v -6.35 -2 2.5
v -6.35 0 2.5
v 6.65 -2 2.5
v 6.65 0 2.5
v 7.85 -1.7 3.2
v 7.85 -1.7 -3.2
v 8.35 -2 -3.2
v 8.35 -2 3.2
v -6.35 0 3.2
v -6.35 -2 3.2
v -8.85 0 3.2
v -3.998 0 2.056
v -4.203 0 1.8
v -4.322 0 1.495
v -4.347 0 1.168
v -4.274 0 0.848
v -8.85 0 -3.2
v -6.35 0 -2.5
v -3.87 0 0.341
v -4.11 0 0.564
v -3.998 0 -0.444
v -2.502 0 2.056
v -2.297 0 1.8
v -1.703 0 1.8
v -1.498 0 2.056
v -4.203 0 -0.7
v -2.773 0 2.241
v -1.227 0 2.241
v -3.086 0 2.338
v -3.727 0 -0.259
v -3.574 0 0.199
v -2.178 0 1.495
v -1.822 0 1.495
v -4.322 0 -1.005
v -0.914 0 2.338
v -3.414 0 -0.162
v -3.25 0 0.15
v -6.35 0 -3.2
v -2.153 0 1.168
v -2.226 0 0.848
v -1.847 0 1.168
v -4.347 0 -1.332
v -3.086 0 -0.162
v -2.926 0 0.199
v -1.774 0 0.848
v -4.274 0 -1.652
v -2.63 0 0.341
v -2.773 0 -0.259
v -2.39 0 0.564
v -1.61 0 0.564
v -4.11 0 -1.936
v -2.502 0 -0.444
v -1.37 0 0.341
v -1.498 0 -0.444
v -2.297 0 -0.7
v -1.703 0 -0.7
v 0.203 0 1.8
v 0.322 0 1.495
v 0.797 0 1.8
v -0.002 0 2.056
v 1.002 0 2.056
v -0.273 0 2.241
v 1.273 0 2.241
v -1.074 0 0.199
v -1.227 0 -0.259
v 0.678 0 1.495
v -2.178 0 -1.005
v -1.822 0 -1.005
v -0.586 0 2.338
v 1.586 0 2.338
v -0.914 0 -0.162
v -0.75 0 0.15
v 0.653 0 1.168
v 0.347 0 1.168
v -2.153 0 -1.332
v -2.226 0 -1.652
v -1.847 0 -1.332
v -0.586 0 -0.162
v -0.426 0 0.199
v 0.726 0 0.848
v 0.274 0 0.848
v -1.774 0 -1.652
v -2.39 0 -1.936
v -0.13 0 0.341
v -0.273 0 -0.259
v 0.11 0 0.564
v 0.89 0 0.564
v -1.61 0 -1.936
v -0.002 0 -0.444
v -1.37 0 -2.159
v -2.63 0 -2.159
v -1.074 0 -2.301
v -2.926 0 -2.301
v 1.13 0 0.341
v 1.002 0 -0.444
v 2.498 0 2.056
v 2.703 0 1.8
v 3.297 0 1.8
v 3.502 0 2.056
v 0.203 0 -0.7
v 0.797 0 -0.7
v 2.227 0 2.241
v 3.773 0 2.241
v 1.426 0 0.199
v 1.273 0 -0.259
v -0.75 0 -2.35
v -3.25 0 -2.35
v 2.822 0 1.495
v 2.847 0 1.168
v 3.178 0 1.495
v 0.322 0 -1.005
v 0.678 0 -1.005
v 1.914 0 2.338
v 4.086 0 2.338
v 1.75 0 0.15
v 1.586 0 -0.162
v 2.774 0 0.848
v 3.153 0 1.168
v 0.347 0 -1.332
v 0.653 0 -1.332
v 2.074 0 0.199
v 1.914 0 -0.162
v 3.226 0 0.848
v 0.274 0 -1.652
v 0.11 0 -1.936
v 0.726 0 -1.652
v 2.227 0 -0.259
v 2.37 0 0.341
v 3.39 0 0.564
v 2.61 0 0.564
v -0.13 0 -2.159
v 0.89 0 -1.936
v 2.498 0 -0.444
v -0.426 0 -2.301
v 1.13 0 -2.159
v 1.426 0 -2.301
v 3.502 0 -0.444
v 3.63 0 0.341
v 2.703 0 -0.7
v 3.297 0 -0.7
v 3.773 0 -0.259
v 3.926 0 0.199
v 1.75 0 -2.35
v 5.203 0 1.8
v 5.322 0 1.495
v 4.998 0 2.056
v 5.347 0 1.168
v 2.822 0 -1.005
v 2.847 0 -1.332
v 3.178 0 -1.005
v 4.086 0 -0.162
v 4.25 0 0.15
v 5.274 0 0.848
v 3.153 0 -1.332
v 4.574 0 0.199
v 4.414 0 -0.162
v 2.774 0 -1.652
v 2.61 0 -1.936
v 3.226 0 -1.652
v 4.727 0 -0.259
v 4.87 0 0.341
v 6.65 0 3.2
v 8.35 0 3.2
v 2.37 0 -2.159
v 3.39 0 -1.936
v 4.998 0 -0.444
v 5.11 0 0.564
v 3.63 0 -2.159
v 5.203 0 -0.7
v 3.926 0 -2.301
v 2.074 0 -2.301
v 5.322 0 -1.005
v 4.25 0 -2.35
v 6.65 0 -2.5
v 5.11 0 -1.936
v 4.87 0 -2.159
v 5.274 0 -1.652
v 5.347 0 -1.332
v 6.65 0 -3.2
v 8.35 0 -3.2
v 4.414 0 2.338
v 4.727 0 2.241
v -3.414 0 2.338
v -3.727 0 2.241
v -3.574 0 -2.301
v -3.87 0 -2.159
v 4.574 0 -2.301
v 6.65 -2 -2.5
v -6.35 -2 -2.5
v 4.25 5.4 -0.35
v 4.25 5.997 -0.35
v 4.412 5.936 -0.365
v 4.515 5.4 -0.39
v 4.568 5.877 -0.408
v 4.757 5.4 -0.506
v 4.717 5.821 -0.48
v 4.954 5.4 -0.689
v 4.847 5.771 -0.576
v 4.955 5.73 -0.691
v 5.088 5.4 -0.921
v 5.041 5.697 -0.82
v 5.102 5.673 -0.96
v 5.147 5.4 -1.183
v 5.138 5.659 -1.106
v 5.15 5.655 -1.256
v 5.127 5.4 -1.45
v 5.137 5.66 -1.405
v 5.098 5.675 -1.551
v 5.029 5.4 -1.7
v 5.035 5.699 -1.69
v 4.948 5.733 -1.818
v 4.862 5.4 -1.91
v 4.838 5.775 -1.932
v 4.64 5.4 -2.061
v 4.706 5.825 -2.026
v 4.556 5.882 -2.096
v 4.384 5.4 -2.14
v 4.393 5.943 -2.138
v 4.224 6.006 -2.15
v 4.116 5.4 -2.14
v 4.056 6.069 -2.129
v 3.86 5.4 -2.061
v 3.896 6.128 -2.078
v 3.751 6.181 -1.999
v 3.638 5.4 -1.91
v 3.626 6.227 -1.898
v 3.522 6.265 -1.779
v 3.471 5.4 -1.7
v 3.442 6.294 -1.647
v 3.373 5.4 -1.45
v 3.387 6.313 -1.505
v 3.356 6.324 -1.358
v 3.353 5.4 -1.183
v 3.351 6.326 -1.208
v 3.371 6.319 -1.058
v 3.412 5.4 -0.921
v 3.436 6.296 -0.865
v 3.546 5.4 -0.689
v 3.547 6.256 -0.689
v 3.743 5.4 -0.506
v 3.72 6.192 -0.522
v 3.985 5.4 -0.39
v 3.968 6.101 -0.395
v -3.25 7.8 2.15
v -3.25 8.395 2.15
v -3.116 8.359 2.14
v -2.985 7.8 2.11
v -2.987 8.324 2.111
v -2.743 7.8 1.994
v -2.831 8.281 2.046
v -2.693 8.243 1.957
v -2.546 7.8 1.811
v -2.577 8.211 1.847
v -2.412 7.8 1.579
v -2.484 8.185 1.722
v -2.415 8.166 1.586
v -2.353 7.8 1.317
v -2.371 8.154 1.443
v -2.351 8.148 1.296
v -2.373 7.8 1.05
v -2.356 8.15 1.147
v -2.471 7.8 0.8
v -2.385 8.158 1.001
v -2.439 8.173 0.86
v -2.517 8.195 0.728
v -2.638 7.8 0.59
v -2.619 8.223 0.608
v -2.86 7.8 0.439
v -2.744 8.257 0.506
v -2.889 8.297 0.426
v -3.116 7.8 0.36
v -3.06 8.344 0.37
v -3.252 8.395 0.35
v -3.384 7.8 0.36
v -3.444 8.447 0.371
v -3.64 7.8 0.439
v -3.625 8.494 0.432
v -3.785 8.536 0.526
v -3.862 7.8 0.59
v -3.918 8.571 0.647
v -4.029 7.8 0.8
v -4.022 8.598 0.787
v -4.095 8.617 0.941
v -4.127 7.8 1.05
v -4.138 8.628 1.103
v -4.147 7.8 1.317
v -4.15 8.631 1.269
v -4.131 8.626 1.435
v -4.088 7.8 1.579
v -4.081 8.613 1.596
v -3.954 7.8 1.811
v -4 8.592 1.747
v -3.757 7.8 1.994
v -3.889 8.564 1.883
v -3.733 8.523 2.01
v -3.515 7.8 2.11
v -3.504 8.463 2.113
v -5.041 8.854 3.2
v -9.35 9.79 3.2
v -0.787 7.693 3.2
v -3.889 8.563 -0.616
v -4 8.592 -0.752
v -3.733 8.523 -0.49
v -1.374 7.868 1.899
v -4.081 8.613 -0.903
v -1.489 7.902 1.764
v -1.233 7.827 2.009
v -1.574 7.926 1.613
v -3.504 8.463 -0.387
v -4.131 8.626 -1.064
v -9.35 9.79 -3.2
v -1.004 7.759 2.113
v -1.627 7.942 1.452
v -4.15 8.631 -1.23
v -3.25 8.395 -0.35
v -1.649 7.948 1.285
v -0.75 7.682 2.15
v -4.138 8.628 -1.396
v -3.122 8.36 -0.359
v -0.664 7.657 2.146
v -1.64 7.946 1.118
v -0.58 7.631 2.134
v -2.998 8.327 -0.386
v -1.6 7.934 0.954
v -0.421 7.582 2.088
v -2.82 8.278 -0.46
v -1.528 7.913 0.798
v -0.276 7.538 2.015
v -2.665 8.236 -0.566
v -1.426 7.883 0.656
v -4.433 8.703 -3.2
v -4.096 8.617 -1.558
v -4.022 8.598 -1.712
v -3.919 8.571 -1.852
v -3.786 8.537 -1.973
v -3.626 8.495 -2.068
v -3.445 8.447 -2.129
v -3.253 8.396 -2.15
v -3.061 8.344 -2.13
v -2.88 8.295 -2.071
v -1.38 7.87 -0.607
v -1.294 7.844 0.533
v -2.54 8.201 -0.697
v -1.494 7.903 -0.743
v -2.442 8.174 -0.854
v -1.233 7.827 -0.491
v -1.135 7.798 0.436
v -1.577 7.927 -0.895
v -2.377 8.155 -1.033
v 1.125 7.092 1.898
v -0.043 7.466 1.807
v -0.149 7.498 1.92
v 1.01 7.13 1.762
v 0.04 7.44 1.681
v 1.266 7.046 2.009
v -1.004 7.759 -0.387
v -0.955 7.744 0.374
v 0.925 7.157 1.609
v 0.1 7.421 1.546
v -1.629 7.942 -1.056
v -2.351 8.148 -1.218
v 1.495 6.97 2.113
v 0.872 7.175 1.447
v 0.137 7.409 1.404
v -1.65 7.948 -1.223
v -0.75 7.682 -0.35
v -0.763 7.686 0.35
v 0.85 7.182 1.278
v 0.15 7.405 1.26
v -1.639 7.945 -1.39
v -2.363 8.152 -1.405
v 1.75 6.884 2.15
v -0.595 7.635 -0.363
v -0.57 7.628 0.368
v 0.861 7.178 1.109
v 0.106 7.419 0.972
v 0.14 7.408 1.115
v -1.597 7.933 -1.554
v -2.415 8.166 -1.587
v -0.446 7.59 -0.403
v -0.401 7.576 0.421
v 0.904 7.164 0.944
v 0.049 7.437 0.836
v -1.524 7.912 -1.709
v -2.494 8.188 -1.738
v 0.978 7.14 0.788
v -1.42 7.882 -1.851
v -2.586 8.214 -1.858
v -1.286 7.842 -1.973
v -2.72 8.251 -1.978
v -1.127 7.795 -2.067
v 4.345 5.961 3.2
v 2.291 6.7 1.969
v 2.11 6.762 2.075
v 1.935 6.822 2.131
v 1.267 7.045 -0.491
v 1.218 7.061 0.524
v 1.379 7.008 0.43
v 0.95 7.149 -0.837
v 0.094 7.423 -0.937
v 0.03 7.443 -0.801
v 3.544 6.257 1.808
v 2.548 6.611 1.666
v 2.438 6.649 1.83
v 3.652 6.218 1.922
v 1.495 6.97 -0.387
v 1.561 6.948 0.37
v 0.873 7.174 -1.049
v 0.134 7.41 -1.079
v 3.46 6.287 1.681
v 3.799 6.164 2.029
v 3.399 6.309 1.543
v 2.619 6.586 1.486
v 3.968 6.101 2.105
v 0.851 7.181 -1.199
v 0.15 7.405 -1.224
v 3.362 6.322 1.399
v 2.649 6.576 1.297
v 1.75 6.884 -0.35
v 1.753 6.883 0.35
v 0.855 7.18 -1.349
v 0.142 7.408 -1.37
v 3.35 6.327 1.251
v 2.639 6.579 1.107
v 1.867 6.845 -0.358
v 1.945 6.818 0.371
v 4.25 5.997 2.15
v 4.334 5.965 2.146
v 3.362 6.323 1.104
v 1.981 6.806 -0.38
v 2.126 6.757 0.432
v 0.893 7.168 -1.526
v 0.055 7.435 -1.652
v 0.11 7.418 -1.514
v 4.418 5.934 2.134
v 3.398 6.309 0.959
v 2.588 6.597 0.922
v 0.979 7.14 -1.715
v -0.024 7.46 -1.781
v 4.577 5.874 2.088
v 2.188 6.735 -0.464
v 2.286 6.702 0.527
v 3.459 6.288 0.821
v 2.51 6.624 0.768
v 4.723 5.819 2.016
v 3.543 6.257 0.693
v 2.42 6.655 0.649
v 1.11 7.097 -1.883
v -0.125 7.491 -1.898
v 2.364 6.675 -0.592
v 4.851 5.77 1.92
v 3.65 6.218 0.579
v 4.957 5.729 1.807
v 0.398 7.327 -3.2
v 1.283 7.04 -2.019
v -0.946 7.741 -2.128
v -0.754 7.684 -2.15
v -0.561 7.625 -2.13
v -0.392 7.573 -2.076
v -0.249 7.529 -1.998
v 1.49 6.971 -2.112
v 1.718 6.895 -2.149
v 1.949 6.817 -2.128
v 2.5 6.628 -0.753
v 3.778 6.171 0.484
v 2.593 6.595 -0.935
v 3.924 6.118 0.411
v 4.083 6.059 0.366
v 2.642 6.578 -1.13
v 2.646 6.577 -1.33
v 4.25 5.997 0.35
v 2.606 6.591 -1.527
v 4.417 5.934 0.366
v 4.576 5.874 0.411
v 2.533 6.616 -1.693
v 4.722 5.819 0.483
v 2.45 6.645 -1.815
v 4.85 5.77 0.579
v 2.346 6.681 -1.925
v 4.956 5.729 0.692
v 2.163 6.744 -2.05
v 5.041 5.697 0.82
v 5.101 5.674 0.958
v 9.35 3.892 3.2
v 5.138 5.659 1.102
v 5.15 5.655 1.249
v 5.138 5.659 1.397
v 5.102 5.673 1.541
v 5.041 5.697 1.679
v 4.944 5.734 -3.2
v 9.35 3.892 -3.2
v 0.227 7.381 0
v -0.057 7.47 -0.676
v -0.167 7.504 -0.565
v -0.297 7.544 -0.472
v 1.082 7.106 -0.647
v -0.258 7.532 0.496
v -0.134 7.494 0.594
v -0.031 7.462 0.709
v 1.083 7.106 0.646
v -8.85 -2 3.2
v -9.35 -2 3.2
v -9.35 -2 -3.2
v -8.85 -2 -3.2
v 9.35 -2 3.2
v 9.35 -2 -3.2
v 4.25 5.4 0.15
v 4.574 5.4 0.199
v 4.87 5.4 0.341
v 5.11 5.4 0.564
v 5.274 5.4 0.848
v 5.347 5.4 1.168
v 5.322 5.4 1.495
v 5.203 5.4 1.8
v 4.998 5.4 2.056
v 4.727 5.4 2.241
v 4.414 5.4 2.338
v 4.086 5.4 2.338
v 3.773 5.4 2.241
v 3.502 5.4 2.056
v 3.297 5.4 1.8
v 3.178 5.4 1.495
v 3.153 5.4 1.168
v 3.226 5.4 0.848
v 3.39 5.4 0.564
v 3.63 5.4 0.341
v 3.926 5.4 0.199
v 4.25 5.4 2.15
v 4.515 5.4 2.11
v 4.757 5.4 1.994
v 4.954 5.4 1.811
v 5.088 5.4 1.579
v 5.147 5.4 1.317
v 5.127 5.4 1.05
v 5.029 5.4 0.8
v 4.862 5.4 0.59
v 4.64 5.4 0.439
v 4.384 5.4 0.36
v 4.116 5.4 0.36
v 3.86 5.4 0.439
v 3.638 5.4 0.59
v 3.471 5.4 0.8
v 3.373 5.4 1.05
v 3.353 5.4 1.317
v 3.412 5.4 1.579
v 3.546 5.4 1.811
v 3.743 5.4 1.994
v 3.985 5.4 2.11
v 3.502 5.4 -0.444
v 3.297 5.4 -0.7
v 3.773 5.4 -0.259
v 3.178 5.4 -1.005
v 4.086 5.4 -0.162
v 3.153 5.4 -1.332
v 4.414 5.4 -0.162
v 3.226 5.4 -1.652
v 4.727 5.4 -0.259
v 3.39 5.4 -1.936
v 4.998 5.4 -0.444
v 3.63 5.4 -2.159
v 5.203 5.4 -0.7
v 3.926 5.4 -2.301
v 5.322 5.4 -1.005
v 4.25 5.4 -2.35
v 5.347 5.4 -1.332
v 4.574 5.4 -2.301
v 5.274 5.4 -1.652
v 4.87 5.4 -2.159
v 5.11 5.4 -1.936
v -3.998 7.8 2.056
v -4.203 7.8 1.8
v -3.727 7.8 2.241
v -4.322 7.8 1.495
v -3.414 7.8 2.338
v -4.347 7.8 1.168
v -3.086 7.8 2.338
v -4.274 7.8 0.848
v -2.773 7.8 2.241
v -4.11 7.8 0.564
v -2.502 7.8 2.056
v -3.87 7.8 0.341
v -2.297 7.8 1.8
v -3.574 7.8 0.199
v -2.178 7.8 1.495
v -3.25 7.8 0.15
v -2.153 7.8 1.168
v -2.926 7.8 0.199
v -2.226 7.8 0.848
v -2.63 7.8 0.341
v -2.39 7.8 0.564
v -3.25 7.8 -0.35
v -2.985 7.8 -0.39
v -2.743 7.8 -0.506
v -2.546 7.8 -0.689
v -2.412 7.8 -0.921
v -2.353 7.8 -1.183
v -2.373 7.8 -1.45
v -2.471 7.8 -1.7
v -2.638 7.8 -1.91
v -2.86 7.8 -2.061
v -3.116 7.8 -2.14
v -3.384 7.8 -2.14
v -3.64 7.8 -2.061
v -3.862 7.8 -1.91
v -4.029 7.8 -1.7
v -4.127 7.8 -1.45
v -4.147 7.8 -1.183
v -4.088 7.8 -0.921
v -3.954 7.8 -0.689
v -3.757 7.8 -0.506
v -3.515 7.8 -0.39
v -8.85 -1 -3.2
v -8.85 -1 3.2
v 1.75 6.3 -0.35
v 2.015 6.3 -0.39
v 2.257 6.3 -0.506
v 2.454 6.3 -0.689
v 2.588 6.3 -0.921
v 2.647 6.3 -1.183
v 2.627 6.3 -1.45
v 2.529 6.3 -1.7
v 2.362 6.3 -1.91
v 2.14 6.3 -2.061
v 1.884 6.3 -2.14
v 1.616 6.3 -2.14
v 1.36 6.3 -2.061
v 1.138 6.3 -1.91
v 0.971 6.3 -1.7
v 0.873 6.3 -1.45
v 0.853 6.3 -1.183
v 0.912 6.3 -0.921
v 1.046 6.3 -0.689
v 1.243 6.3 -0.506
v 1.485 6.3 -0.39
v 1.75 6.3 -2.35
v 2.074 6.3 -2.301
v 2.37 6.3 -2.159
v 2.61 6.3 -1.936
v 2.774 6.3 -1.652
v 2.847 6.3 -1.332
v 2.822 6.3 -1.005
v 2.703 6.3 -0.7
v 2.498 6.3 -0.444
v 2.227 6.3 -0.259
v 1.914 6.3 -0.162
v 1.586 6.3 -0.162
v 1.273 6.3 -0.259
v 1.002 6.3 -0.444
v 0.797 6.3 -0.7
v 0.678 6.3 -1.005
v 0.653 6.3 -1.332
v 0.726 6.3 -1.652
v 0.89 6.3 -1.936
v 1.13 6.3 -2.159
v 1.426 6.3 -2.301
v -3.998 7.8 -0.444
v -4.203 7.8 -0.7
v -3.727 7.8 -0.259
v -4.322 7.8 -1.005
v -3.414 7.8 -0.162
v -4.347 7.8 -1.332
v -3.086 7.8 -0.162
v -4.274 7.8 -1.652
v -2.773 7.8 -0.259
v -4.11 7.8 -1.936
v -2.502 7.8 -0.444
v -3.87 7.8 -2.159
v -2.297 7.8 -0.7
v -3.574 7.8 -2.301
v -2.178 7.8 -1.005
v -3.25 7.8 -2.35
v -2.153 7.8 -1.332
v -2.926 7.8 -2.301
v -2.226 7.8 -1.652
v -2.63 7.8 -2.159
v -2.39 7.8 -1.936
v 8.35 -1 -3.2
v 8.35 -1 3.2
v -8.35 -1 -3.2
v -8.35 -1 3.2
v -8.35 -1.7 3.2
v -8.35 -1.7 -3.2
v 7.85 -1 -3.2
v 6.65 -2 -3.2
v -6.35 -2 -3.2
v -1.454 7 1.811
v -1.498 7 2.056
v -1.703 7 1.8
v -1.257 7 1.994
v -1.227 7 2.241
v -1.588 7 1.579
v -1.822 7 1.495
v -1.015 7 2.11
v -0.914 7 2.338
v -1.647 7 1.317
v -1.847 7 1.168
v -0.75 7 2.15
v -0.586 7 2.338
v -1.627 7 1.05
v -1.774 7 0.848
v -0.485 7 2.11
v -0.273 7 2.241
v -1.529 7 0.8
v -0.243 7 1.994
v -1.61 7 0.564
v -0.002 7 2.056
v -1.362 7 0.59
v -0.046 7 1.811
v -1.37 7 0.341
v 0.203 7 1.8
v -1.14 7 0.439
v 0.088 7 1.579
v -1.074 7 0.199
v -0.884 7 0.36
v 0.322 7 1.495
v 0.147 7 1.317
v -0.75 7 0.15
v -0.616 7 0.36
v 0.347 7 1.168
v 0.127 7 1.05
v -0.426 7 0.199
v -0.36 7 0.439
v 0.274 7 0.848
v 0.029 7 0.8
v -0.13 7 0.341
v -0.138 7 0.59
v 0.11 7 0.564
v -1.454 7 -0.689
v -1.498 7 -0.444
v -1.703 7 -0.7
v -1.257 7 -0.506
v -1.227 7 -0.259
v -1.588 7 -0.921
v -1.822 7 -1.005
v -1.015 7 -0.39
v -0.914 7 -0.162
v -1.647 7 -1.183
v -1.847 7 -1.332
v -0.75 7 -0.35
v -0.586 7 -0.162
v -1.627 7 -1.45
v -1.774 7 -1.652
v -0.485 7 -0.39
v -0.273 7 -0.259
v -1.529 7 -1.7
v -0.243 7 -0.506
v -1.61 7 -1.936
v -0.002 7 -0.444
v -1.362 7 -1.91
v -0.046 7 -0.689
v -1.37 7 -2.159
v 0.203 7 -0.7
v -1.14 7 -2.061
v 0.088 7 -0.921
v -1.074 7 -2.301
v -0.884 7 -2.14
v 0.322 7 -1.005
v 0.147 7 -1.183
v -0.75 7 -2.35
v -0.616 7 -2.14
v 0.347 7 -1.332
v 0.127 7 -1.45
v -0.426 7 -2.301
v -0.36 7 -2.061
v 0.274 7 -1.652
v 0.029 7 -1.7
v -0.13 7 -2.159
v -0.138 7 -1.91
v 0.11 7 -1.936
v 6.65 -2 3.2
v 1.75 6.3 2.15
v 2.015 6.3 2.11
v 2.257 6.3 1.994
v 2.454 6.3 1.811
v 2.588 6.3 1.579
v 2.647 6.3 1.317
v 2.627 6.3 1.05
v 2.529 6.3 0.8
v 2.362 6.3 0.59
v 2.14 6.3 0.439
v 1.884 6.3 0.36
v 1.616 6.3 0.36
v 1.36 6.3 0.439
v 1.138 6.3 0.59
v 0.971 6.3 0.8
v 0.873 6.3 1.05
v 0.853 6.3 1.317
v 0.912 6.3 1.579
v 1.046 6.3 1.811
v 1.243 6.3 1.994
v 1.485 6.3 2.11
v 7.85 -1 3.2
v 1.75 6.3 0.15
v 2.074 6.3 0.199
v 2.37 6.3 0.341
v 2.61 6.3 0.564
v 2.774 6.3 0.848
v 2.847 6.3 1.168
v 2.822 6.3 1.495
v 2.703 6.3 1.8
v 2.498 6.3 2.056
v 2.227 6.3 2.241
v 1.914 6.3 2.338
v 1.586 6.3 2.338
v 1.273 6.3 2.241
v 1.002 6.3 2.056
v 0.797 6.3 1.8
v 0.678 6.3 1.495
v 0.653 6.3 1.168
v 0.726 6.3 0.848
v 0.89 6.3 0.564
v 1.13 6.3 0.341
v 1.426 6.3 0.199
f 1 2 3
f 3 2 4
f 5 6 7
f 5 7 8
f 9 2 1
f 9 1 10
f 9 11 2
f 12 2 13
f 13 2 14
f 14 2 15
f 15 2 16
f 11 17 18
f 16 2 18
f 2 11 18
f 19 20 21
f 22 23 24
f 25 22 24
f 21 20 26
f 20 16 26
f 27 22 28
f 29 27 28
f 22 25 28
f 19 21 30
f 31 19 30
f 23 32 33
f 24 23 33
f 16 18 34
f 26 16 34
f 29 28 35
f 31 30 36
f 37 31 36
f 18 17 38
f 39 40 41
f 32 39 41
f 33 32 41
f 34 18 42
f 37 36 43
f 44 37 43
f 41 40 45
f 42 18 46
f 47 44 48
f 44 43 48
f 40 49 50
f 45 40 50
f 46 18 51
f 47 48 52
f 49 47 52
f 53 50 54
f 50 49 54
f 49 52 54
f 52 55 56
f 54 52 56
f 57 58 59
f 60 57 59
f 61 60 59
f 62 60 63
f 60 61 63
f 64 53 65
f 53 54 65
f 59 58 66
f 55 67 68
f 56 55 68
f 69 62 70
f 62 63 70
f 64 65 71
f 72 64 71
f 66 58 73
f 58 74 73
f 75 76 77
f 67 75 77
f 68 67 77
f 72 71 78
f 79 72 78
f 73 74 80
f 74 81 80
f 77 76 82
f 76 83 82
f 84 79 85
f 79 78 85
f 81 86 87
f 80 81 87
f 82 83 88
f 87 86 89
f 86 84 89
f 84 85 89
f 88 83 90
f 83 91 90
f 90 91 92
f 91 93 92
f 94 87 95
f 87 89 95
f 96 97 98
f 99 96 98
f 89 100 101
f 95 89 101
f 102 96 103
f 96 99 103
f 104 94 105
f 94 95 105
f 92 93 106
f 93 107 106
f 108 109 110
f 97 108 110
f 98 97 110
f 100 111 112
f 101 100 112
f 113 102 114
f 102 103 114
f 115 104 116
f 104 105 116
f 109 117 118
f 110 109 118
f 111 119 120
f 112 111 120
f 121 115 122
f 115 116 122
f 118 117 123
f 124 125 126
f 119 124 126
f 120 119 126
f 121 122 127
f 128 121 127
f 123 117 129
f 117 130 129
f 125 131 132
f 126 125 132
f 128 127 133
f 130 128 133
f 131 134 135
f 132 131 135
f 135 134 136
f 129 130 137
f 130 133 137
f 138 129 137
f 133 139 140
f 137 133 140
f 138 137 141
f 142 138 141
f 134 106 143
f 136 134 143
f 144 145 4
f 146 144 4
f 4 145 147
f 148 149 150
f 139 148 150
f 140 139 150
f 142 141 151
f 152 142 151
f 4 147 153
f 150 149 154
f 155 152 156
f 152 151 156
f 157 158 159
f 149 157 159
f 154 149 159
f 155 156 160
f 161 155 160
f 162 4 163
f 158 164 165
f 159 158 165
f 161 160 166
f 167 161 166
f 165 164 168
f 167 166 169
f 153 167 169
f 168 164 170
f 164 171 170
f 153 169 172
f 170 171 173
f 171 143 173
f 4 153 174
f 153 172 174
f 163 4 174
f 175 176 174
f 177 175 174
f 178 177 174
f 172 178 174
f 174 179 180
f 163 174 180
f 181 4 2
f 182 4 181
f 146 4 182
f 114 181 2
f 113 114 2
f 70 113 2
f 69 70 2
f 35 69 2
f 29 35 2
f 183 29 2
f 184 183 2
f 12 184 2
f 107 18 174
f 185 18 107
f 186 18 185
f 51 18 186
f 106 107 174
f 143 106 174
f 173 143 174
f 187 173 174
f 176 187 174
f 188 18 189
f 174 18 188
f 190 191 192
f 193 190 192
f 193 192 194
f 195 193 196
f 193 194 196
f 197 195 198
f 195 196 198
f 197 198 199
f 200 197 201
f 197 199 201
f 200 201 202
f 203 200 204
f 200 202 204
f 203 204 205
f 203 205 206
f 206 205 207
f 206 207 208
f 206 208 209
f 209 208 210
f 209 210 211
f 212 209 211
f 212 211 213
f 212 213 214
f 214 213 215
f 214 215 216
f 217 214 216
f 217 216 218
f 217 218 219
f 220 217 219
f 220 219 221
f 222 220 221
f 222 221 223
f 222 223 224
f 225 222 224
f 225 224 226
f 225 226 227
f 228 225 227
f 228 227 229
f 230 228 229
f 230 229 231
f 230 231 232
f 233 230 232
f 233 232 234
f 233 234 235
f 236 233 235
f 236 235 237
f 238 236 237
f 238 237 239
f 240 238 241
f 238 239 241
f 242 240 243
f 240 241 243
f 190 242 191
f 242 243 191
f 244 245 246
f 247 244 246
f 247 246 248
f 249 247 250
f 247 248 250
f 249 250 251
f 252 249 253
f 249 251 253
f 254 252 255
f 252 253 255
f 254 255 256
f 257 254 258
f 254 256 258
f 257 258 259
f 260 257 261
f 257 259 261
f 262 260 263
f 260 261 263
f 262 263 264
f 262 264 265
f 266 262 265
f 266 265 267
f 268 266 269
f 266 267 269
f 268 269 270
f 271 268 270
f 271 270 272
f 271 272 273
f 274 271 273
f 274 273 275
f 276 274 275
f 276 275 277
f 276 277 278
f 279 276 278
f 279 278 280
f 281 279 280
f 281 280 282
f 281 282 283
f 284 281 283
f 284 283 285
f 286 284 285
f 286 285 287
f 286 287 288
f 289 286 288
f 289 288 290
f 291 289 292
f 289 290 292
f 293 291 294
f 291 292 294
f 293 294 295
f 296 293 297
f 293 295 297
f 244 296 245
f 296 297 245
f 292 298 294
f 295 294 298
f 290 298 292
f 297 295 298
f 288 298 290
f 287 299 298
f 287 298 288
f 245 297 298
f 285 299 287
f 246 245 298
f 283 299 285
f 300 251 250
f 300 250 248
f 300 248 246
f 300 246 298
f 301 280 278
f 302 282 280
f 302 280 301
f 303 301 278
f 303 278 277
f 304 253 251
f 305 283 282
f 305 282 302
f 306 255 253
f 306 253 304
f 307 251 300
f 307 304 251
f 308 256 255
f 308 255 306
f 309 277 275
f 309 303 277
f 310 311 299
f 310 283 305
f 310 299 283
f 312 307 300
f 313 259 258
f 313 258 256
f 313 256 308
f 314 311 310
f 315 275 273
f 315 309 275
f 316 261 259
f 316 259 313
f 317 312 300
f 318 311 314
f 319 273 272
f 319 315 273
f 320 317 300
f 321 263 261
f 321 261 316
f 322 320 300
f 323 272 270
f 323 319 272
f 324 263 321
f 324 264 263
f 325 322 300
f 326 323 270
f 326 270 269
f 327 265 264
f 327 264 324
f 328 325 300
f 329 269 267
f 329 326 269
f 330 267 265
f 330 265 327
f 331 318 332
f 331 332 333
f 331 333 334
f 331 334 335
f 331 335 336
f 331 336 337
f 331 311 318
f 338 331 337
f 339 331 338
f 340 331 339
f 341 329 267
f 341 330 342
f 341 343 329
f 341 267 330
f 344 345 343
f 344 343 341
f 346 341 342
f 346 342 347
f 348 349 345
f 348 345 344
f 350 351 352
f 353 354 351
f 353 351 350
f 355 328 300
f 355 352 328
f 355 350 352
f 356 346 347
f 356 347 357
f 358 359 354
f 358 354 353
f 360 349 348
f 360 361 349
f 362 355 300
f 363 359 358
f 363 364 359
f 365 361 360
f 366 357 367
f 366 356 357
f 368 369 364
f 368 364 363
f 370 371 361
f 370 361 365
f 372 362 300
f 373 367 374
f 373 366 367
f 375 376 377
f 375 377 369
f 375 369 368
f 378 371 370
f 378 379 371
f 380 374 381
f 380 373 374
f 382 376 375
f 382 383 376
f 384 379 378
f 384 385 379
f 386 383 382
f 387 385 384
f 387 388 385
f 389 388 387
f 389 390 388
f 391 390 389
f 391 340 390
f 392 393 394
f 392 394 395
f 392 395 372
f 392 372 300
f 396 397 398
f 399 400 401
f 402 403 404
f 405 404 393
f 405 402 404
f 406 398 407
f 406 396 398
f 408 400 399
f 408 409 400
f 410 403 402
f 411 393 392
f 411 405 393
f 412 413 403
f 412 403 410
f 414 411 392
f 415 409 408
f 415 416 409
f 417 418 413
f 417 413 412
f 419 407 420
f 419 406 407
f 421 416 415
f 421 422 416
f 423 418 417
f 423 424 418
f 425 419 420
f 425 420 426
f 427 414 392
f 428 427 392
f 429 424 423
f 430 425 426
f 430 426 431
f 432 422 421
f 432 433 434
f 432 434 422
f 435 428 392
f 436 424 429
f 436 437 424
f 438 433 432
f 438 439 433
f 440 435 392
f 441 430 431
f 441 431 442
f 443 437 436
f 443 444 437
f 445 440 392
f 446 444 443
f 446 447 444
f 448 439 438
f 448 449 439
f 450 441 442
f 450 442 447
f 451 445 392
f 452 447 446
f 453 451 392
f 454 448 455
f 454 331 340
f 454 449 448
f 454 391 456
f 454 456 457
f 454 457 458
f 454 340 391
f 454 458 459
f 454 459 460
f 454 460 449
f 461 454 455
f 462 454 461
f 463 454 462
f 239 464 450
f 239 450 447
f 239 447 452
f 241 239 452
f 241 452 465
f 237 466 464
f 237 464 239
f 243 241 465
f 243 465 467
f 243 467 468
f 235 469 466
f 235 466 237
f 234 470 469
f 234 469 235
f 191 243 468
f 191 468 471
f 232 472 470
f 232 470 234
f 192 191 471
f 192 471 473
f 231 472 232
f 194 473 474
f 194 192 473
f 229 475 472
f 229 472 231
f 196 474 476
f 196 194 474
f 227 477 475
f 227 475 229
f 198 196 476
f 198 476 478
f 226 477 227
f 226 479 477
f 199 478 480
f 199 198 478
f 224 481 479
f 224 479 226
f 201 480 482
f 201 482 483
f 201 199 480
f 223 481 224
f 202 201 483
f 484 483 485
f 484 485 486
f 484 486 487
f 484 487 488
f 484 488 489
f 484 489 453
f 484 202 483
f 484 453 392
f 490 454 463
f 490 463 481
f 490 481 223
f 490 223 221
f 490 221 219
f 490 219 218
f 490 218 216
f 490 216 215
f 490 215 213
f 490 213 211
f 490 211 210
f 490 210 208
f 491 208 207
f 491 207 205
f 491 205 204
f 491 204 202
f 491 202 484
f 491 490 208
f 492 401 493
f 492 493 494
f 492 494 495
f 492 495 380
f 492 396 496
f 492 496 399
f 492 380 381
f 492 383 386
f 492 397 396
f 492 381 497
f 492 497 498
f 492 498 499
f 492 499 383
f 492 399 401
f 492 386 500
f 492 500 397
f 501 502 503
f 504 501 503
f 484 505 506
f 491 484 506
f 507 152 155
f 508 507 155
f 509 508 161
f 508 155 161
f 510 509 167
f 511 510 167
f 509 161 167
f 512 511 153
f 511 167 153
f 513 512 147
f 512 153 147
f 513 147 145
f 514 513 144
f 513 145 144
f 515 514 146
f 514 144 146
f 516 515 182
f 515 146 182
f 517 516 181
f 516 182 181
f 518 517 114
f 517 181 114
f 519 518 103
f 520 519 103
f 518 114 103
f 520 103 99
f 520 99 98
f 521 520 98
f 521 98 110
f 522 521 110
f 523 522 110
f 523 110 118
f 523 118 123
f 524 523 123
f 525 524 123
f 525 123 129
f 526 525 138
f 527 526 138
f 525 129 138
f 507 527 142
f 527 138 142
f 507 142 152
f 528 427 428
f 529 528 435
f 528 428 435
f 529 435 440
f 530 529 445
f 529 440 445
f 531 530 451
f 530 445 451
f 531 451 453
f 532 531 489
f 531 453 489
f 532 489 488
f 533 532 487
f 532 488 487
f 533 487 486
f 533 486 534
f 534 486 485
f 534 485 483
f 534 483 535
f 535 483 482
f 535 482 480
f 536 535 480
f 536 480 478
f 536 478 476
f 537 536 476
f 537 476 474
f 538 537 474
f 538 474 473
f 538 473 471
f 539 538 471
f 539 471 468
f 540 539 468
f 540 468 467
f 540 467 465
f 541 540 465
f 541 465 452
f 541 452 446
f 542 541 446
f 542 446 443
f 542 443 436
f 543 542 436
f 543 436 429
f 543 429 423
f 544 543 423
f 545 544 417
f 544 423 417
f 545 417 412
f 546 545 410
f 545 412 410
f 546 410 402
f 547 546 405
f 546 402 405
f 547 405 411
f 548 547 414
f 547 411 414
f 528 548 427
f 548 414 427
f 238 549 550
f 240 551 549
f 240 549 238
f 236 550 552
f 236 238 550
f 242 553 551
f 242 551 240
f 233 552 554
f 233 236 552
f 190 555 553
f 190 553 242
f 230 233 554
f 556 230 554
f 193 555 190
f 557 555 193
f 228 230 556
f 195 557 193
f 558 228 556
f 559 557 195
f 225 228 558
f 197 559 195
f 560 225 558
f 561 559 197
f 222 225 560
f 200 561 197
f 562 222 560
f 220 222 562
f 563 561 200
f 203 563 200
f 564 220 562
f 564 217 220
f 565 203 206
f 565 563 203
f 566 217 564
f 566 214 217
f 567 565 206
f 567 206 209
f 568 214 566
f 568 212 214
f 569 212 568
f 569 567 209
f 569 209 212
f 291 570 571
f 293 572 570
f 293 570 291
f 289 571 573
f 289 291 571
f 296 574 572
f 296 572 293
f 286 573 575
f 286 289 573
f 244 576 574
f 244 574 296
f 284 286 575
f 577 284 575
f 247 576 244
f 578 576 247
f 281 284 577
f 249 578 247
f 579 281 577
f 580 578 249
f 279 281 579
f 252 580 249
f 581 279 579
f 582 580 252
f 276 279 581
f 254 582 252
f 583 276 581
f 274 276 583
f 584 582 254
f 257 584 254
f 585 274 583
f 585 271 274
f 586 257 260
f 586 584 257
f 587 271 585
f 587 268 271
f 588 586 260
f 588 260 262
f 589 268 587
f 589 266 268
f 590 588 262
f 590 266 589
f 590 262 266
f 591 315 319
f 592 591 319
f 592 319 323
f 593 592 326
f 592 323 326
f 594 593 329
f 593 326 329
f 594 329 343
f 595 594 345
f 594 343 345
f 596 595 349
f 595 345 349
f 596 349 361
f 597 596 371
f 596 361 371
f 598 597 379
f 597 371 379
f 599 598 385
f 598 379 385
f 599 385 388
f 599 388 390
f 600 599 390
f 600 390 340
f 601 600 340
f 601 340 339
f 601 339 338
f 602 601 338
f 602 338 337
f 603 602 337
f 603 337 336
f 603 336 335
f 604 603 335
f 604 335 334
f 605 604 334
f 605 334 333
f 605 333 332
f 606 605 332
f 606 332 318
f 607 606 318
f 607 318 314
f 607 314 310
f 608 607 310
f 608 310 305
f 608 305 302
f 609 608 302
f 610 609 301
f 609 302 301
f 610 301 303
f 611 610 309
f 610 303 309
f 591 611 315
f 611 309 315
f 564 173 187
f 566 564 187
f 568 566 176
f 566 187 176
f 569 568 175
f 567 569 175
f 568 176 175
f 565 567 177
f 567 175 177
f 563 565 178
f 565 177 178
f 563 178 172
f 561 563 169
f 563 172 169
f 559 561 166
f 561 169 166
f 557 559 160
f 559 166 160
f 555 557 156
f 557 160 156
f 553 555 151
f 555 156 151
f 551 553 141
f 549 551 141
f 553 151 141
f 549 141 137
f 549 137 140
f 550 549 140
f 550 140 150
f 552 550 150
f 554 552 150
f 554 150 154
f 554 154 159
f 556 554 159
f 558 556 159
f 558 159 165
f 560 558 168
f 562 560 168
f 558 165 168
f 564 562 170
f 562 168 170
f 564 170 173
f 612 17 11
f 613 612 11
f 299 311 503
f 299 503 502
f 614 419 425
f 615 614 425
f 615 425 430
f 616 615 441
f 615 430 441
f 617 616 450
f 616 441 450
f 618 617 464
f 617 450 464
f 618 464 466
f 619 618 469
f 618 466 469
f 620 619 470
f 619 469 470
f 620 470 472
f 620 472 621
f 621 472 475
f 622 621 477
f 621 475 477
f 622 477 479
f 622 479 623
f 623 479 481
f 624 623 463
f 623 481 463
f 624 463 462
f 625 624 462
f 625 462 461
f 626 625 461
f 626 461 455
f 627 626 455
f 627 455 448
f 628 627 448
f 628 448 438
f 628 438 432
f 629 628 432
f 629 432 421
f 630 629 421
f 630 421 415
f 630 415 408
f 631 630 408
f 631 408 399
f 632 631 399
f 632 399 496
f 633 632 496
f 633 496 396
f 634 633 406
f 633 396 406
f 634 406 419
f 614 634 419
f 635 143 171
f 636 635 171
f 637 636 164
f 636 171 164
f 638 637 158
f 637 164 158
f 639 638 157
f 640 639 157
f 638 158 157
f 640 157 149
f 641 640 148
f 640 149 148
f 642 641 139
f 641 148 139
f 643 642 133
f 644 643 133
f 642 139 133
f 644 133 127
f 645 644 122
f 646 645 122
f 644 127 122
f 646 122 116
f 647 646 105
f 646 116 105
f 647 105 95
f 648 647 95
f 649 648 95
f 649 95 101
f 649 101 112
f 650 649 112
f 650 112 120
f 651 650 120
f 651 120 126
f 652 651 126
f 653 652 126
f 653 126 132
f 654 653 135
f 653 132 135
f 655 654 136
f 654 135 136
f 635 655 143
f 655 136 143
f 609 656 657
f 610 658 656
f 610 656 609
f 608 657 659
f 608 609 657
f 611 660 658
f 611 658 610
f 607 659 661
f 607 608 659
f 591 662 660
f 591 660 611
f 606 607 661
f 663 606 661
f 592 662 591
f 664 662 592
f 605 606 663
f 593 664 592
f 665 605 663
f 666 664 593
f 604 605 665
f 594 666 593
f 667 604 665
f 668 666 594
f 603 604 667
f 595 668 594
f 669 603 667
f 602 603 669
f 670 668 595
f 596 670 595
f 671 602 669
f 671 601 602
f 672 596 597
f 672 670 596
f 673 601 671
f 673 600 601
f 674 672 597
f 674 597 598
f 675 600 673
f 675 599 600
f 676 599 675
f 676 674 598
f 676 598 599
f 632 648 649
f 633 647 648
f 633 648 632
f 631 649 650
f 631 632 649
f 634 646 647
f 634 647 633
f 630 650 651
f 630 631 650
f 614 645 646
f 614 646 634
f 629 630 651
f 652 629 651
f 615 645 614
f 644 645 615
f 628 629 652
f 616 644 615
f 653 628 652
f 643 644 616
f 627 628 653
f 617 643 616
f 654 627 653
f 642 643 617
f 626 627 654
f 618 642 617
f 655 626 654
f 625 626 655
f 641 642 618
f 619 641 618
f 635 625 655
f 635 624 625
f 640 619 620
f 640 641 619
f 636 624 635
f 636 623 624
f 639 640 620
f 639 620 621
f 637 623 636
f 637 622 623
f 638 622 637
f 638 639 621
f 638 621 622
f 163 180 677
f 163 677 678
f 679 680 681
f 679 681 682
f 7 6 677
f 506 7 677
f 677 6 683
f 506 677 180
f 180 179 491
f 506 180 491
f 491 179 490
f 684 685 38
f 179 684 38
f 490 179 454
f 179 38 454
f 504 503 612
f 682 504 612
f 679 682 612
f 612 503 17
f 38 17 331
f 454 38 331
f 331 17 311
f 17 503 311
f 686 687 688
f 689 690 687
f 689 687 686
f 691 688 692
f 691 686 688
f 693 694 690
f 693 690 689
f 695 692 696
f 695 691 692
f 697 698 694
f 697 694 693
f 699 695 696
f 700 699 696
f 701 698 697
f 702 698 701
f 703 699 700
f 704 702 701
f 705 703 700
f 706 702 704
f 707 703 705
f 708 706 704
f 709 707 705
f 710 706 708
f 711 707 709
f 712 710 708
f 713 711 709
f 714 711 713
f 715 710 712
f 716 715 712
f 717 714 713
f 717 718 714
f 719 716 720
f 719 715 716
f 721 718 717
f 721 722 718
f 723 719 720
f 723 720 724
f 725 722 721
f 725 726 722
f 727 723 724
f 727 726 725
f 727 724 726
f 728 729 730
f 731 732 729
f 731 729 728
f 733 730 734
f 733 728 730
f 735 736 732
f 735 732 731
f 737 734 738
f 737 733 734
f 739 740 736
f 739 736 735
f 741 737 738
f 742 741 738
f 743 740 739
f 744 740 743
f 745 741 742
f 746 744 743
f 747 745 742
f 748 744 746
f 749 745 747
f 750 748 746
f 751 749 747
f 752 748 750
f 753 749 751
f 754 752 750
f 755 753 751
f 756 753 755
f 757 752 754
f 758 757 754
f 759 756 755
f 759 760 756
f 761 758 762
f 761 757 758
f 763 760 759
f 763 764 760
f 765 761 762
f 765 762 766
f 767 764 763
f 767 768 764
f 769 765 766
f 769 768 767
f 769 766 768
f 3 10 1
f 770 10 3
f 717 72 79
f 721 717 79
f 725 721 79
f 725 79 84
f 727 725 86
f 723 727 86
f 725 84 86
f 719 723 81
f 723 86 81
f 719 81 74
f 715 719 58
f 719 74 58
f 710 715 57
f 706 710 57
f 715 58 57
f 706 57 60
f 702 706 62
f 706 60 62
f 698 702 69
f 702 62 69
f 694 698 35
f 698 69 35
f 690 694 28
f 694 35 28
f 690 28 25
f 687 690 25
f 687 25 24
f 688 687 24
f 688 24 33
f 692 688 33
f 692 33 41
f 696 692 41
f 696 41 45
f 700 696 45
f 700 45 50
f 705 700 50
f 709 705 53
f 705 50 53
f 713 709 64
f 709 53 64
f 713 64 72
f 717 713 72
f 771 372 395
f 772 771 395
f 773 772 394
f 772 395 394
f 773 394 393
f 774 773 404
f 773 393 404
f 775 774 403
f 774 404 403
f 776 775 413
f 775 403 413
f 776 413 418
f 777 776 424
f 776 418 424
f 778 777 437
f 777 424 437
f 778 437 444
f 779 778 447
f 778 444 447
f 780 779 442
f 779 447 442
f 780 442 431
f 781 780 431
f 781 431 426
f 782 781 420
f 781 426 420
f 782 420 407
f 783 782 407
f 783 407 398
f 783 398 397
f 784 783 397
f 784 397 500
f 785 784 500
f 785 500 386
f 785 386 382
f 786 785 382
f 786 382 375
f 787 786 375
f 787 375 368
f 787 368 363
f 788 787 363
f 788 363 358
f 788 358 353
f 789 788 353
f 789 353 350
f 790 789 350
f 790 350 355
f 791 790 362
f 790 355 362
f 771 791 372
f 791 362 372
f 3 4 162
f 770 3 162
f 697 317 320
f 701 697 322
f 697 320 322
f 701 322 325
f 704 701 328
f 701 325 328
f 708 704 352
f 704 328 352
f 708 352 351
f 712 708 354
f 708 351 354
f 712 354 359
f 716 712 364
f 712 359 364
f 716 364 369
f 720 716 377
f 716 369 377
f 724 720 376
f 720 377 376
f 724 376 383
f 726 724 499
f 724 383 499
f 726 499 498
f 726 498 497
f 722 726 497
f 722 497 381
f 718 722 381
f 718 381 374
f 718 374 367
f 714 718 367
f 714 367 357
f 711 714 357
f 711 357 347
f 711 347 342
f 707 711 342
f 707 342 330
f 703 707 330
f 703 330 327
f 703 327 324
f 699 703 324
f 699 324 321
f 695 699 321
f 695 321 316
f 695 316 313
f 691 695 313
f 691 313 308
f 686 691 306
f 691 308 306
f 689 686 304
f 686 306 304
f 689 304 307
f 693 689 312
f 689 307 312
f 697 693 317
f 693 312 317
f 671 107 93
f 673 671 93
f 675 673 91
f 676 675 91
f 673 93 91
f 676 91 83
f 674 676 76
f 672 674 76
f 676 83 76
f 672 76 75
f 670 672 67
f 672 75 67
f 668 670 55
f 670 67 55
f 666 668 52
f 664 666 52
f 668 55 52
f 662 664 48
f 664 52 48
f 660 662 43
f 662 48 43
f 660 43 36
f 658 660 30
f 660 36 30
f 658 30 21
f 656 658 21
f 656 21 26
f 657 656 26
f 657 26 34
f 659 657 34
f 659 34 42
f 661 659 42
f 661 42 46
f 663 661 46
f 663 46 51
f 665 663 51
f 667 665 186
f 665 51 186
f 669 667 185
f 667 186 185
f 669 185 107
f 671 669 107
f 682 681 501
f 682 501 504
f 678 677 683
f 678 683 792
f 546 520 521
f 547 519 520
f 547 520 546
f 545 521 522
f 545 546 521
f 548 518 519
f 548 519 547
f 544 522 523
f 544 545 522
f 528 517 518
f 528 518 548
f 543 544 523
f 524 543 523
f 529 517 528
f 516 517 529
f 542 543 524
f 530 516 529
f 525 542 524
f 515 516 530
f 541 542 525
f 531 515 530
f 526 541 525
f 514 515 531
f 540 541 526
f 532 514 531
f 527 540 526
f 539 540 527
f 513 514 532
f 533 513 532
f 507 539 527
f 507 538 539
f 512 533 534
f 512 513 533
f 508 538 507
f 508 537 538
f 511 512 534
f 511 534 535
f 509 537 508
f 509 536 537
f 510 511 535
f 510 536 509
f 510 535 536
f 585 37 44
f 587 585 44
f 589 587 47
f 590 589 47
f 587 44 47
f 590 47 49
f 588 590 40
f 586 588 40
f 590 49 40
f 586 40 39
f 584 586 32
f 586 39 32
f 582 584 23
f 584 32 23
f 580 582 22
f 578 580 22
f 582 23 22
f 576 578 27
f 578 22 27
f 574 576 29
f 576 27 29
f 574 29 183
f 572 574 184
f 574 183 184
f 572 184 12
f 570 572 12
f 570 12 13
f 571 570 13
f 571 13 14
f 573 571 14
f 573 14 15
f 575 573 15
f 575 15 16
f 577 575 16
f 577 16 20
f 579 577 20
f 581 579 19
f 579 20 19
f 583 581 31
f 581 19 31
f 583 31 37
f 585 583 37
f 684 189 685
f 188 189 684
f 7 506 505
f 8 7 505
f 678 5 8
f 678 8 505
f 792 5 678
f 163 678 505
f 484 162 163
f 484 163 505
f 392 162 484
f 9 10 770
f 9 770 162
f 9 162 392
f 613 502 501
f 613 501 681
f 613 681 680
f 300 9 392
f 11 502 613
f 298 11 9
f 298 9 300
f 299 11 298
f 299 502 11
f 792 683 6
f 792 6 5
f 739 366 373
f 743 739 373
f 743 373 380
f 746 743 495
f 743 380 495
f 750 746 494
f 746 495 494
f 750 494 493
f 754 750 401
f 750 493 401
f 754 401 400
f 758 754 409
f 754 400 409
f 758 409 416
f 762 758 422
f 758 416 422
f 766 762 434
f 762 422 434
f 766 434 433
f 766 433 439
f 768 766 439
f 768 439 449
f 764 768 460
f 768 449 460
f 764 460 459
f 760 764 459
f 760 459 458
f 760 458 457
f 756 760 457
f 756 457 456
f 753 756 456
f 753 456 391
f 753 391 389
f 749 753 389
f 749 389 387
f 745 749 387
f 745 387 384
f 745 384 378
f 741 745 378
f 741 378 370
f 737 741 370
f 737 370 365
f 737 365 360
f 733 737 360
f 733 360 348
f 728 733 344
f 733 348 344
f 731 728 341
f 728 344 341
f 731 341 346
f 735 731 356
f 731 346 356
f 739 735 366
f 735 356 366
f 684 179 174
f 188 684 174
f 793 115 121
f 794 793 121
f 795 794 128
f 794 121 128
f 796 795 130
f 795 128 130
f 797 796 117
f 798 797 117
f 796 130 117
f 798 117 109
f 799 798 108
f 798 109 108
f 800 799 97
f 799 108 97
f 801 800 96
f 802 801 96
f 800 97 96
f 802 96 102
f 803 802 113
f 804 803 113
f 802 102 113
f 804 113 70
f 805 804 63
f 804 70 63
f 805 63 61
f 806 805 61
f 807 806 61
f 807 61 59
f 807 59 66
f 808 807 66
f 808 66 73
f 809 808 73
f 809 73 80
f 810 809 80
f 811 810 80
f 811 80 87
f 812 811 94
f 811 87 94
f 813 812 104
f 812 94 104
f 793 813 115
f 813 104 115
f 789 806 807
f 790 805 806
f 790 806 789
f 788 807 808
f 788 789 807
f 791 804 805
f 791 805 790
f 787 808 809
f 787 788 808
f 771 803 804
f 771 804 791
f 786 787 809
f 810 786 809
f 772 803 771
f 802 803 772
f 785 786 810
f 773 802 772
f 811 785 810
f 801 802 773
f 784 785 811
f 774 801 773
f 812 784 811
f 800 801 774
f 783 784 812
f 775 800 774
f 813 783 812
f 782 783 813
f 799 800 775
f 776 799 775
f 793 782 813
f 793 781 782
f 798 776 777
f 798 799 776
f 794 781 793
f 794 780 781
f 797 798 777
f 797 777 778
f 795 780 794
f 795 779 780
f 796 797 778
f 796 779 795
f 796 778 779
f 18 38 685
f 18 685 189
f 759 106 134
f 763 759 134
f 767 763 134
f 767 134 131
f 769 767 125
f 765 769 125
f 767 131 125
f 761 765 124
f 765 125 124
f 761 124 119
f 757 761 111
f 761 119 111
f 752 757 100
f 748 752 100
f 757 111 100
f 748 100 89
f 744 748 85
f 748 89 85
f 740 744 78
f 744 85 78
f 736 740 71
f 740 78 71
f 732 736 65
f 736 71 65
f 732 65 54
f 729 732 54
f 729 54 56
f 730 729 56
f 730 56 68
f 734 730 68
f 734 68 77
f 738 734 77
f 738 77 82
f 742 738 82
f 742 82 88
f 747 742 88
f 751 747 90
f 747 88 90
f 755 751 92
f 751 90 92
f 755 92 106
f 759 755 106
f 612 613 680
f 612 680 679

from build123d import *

# Parameters (mm, degrees)
SKETCH1_W             = 18.7
SKETCH1_H             = 6.4
BOSS_EXTRUDE1_DEPTH   = 13
SKETCH2_W             = 13
SKETCH2_H             = 0.7
SKETCH2_W_2           = 0.5
SKETCH2_H_2           = 6.4
SKETCH2_W_3           = 1
BOSS_EXTRUDE2_DEPTH   = 2
CUT_EXTRUDE1_REACH    = 17
SKETCH3_R             = 0.9
CUT_EXTRUDE2_REACH    = 8.4
SKETCH5_R             = 1.1
CUT_EXTRUDE3_DEPTH    = 5.4
SKETCH6_R             = 1.1
CUT_EXTRUDE4_DEPTH    = 6.3
SKETCH7_R             = 1.1
CUT_EXTRUDE5_DEPTH    = 7
SKETCH8_R             = 1.1
CUT_EXTRUDE6_DEPTH    = 7.8
SKETCH10_W            = 6.4
SKETCH10_H            = 1
BOSS_EXTRUDE3_DEPTH   = 0.5
SKETCH11_W            = 6.4
SKETCH11_H            = 1
BOSS_EXTRUDE4_DEPTH   = 0.5
CHAMFER1_SIZE         = 0.5
CHAMFER1_SIZE2        = 0.3
CHAMFER1_PART_2_SIZE  = 0.5
CHAMFER1_PART_2_SIZE2 = 0.3


with BuildPart() as part:
    # Sketch1 → Boss-Extrude1 (new body)
    with BuildSketch(Plane(origin=(0, 0, 0), x_dir=(1, 0, 0), z_dir=(0, 1, 0))):
        Rectangle(SKETCH1_W, SKETCH1_H)
    extrude(amount=BOSS_EXTRUDE1_DEPTH)

    # Sketch2 → Boss-Extrude2 (add)
    with BuildSketch(Plane.XZ):
        with Locations((0.15, 2.85)):
            Rectangle(SKETCH2_W, SKETCH2_H)
        with Locations((0.15, -2.85)):
            Rectangle(SKETCH2_W, SKETCH2_H)
        with Locations((-9.1, 0)):
            Rectangle(SKETCH2_W_2, SKETCH2_H_2)
        with Locations((8.85, 0)):
            Rectangle(SKETCH2_W_3, SKETCH2_H_2)
    extrude(amount=BOSS_EXTRUDE2_DEPTH)

    # Sketch3 → Cut-Extrude1 (cut, up to next)
    with BuildSketch(Plane(origin=(0, 13, 0), x_dir=(1, 0, 0), z_dir=(0, 1, 0)), mode=Mode.PRIVATE) as cut_extrude1_sk1:
        with Locations(Location((4.25, -1.25, 0), (0, 0, 270))):  # turned: the seam where the file's is
            Circle(SKETCH3_R)
    cut_extrude1_tool1 = extrude(cut_extrude1_sk1.sketch, amount=-CUT_EXTRUDE1_REACH, mode=Mode.PRIVATE) & part.part
    add(cut_extrude1_tool1.solids().sort_by_distance((4.25, 13, 1.25))[0], mode=Mode.SUBTRACT)
    # Sketch3 → Cut-Extrude1 (cut, up to next)
    with BuildSketch(Plane(origin=(0, 13, 0), x_dir=(1, 0, 0), z_dir=(0, 1, 0)), mode=Mode.PRIVATE) as cut_extrude1_sk2:
        with Locations(Location((1.75, -1.25, 0), (0, 0, 270))):  # turned: the seam where the file's is
            Circle(SKETCH3_R)
    cut_extrude1_tool2 = extrude(cut_extrude1_sk2.sketch, amount=-CUT_EXTRUDE1_REACH, mode=Mode.PRIVATE) & part.part
    add(cut_extrude1_tool2.solids().sort_by_distance((1.75, 13, 1.25))[0], mode=Mode.SUBTRACT)
    # Sketch3 → Cut-Extrude1 (cut, up to next)
    with BuildSketch(Plane(origin=(0, 13, 0), x_dir=(1, 0, 0), z_dir=(0, 1, 0)), mode=Mode.PRIVATE) as cut_extrude1_sk3:
        with Locations(Location((-0.75, -1.25, 0), (0, 0, 270))):  # turned: the seam where the file's is
            Circle(SKETCH3_R)
    cut_extrude1_tool3 = extrude(cut_extrude1_sk3.sketch, amount=-CUT_EXTRUDE1_REACH, mode=Mode.PRIVATE) & part.part
    add(cut_extrude1_tool3.solids().sort_by_distance((-0.75, 13, 1.25))[0], mode=Mode.SUBTRACT)
    # Sketch3 → Cut-Extrude1 (cut, up to next)
    with BuildSketch(Plane(origin=(0, 13, 0), x_dir=(1, 0, 0), z_dir=(0, 1, 0)), mode=Mode.PRIVATE) as cut_extrude1_sk4:
        with Locations(Location((-3.25, -1.25, 0), (0, 0, 270))):  # turned: the seam where the file's is
            Circle(SKETCH3_R)
    cut_extrude1_tool4 = extrude(cut_extrude1_sk4.sketch, amount=-CUT_EXTRUDE1_REACH, mode=Mode.PRIVATE) & part.part
    add(cut_extrude1_tool4.solids().sort_by_distance((-3.25, 13, 1.25))[0], mode=Mode.SUBTRACT)
    # Sketch3 → Cut-Extrude1 (cut, up to next)
    with BuildSketch(Plane(origin=(0, 13, 0), x_dir=(1, 0, 0), z_dir=(0, 1, 0)), mode=Mode.PRIVATE) as cut_extrude1_sk5:
        with Locations(Location((4.25, 1.25, 0), (0, 0, 270))):  # turned: the seam where the file's is
            Circle(SKETCH3_R)
    cut_extrude1_tool5 = extrude(cut_extrude1_sk5.sketch, amount=-CUT_EXTRUDE1_REACH, mode=Mode.PRIVATE) & part.part
    add(cut_extrude1_tool5.solids().sort_by_distance((4.25, 13, -1.25))[0], mode=Mode.SUBTRACT)
    # Sketch3 → Cut-Extrude1 (cut, up to next)
    with BuildSketch(Plane(origin=(0, 13, 0), x_dir=(1, 0, 0), z_dir=(0, 1, 0)), mode=Mode.PRIVATE) as cut_extrude1_sk6:
        with Locations(Location((1.75, 1.25, 0), (0, 0, 270))):  # turned: the seam where the file's is
            Circle(SKETCH3_R)
    cut_extrude1_tool6 = extrude(cut_extrude1_sk6.sketch, amount=-CUT_EXTRUDE1_REACH, mode=Mode.PRIVATE) & part.part
    add(cut_extrude1_tool6.solids().sort_by_distance((1.75, 13, -1.25))[0], mode=Mode.SUBTRACT)
    # Sketch3 → Cut-Extrude1 (cut, up to next)
    with BuildSketch(Plane(origin=(0, 13, 0), x_dir=(1, 0, 0), z_dir=(0, 1, 0)), mode=Mode.PRIVATE) as cut_extrude1_sk7:
        with Locations(Location((-0.75, 1.25, 0), (0, 0, 270))):  # turned: the seam where the file's is
            Circle(SKETCH3_R)
    cut_extrude1_tool7 = extrude(cut_extrude1_sk7.sketch, amount=-CUT_EXTRUDE1_REACH, mode=Mode.PRIVATE) & part.part
    add(cut_extrude1_tool7.solids().sort_by_distance((-0.75, 13, -1.25))[0], mode=Mode.SUBTRACT)
    # Sketch3 → Cut-Extrude1 (cut, up to next)
    with BuildSketch(Plane(origin=(0, 13, 0), x_dir=(1, 0, 0), z_dir=(0, 1, 0)), mode=Mode.PRIVATE) as cut_extrude1_sk8:
        with Locations(Location((-3.25, 1.25, 0), (0, 0, 270))):  # turned: the seam where the file's is
            Circle(SKETCH3_R)
    cut_extrude1_tool8 = extrude(cut_extrude1_sk8.sketch, amount=-CUT_EXTRUDE1_REACH, mode=Mode.PRIVATE) & part.part
    add(cut_extrude1_tool8.solids().sort_by_distance((-3.25, 13, -1.25))[0], mode=Mode.SUBTRACT)

    # Sketch4 → Cut-Extrude2 (cut, up to next)
    with BuildSketch(Plane(origin=(0, 0, -3.2), x_dir=(-1, 0, 0), z_dir=(0, 0, -1)), mode=Mode.PRIVATE) as cut_extrude2_sk1:
        with BuildLine():
            Line((-9.35, 13), (9.35, 13))
            Line((9.35, 13), (9.35, 9.790050428))
            add(Edge.make_bspline(
                [(9.35, 9.790050428), (-0.455442008, 7.925691322), (-9.35, 3.892093752)],
                knots=[1.786761572, 1.786761572, 1.786761572, 2.052876958, 2.052876958, 2.052876958], degree=2, weights=[1, 0.991160878, 1]))
            Line((-9.35, 3.892093752), (-9.35, 13))
        make_face()
    cut_extrude2_tool1 = extrude(cut_extrude2_sk1.sketch, amount=-CUT_EXTRUDE2_REACH, mode=Mode.PRIVATE) & part.part
    add(cut_extrude2_tool1.solids().sort_by_distance((1.591729, 9.871634, -3.2))[0], mode=Mode.SUBTRACT)

    # Sketch5 → Cut-Extrude3 (cut)
    with BuildSketch(Plane.XZ):
        with Locations(Location((4.25, -1.25, 0), (0, 0, 270))):  # turned: the seam where the file's is
            Circle(SKETCH5_R)
        with Locations(Location((4.25, 1.25, 0), (0, 0, 270))):  # turned: the seam where the file's is
            Circle(SKETCH5_R)
    extrude(amount=-CUT_EXTRUDE3_DEPTH, mode=Mode.SUBTRACT)

    # Sketch6 → Cut-Extrude4 (cut)
    with BuildSketch(Plane.XZ):
        with Locations(Location((1.75, 1.25, 0), (0, 0, 270))):  # turned: the seam where the file's is
            Circle(SKETCH6_R)
        with Locations(Location((1.75, -1.25, 0), (0, 0, 270))):  # turned: the seam where the file's is
            Circle(SKETCH6_R)
    extrude(amount=-CUT_EXTRUDE4_DEPTH, mode=Mode.SUBTRACT)

    # Sketch7 → Cut-Extrude5 (cut)
    with BuildSketch(Plane.XZ):
        with Locations(Location((-0.75, 1.25, 0), (0, 0, 270))):  # turned: the seam where the file's is
            Circle(SKETCH7_R)
        with Locations(Location((-0.75, -1.25, 0), (0, 0, 270))):  # turned: the seam where the file's is
            Circle(SKETCH7_R)
    extrude(amount=-CUT_EXTRUDE5_DEPTH, mode=Mode.SUBTRACT)

    # Sketch8 → Cut-Extrude6 (cut)
    with BuildSketch(Plane.XZ):
        with Locations(Location((-3.25, 1.25, 0), (0, 0, 270))):  # turned: the seam where the file's is
            Circle(SKETCH8_R)
        with Locations(Location((-3.25, -1.25, 0), (0, 0, 270))):  # turned: the seam where the file's is
            Circle(SKETCH8_R)
    extrude(amount=-CUT_EXTRUDE6_DEPTH, mode=Mode.SUBTRACT)

    # Sketch10 → Boss-Extrude3 (add)
    with BuildSketch(Plane.ZY.offset(-8.35)):
        with Locations((0, -1.5)):
            Rectangle(SKETCH10_W, SKETCH10_H)
    extrude(amount=BOSS_EXTRUDE3_DEPTH)

    # Sketch11 → Boss-Extrude4 (add)
    with BuildSketch(Plane(origin=(-8.85, 0, 0), x_dir=(0, 0, -1), z_dir=(1, 0, 0))):
        with Locations((0, -1.5)):
            Rectangle(SKETCH11_W, SKETCH11_H)
    extrude(amount=BOSS_EXTRUDE4_DEPTH)

    # Chamfer1
    chamfer1_edges = [part.edges().sort_by_distance(p)[0] for p in [
        (7.85, -2, 0),
    ]]
    chamfer1_side = [part.faces().sort_by_distance(p)[0] for p in [
        (8.6, -2, 0),
    ]]
    chamfer(chamfer1_edges, length=CHAMFER1_SIZE, length2=CHAMFER1_SIZE2, reference=chamfer1_side[0])

    # Chamfer1 part 2
    chamfer1_part_2_edges = [part.edges().sort_by_distance(p)[0] for p in [
        (-8.35, -2, 0),
    ]]
    chamfer1_part_2_side = [part.faces().sort_by_distance(p)[0] for p in [
        (-8.85, -2, 0),
    ]]
    chamfer(chamfer1_part_2_edges, length=CHAMFER1_PART_2_SIZE, length2=CHAMFER1_PART_2_SIZE2, reference=chamfer1_part_2_side[0])


solid = part.part
